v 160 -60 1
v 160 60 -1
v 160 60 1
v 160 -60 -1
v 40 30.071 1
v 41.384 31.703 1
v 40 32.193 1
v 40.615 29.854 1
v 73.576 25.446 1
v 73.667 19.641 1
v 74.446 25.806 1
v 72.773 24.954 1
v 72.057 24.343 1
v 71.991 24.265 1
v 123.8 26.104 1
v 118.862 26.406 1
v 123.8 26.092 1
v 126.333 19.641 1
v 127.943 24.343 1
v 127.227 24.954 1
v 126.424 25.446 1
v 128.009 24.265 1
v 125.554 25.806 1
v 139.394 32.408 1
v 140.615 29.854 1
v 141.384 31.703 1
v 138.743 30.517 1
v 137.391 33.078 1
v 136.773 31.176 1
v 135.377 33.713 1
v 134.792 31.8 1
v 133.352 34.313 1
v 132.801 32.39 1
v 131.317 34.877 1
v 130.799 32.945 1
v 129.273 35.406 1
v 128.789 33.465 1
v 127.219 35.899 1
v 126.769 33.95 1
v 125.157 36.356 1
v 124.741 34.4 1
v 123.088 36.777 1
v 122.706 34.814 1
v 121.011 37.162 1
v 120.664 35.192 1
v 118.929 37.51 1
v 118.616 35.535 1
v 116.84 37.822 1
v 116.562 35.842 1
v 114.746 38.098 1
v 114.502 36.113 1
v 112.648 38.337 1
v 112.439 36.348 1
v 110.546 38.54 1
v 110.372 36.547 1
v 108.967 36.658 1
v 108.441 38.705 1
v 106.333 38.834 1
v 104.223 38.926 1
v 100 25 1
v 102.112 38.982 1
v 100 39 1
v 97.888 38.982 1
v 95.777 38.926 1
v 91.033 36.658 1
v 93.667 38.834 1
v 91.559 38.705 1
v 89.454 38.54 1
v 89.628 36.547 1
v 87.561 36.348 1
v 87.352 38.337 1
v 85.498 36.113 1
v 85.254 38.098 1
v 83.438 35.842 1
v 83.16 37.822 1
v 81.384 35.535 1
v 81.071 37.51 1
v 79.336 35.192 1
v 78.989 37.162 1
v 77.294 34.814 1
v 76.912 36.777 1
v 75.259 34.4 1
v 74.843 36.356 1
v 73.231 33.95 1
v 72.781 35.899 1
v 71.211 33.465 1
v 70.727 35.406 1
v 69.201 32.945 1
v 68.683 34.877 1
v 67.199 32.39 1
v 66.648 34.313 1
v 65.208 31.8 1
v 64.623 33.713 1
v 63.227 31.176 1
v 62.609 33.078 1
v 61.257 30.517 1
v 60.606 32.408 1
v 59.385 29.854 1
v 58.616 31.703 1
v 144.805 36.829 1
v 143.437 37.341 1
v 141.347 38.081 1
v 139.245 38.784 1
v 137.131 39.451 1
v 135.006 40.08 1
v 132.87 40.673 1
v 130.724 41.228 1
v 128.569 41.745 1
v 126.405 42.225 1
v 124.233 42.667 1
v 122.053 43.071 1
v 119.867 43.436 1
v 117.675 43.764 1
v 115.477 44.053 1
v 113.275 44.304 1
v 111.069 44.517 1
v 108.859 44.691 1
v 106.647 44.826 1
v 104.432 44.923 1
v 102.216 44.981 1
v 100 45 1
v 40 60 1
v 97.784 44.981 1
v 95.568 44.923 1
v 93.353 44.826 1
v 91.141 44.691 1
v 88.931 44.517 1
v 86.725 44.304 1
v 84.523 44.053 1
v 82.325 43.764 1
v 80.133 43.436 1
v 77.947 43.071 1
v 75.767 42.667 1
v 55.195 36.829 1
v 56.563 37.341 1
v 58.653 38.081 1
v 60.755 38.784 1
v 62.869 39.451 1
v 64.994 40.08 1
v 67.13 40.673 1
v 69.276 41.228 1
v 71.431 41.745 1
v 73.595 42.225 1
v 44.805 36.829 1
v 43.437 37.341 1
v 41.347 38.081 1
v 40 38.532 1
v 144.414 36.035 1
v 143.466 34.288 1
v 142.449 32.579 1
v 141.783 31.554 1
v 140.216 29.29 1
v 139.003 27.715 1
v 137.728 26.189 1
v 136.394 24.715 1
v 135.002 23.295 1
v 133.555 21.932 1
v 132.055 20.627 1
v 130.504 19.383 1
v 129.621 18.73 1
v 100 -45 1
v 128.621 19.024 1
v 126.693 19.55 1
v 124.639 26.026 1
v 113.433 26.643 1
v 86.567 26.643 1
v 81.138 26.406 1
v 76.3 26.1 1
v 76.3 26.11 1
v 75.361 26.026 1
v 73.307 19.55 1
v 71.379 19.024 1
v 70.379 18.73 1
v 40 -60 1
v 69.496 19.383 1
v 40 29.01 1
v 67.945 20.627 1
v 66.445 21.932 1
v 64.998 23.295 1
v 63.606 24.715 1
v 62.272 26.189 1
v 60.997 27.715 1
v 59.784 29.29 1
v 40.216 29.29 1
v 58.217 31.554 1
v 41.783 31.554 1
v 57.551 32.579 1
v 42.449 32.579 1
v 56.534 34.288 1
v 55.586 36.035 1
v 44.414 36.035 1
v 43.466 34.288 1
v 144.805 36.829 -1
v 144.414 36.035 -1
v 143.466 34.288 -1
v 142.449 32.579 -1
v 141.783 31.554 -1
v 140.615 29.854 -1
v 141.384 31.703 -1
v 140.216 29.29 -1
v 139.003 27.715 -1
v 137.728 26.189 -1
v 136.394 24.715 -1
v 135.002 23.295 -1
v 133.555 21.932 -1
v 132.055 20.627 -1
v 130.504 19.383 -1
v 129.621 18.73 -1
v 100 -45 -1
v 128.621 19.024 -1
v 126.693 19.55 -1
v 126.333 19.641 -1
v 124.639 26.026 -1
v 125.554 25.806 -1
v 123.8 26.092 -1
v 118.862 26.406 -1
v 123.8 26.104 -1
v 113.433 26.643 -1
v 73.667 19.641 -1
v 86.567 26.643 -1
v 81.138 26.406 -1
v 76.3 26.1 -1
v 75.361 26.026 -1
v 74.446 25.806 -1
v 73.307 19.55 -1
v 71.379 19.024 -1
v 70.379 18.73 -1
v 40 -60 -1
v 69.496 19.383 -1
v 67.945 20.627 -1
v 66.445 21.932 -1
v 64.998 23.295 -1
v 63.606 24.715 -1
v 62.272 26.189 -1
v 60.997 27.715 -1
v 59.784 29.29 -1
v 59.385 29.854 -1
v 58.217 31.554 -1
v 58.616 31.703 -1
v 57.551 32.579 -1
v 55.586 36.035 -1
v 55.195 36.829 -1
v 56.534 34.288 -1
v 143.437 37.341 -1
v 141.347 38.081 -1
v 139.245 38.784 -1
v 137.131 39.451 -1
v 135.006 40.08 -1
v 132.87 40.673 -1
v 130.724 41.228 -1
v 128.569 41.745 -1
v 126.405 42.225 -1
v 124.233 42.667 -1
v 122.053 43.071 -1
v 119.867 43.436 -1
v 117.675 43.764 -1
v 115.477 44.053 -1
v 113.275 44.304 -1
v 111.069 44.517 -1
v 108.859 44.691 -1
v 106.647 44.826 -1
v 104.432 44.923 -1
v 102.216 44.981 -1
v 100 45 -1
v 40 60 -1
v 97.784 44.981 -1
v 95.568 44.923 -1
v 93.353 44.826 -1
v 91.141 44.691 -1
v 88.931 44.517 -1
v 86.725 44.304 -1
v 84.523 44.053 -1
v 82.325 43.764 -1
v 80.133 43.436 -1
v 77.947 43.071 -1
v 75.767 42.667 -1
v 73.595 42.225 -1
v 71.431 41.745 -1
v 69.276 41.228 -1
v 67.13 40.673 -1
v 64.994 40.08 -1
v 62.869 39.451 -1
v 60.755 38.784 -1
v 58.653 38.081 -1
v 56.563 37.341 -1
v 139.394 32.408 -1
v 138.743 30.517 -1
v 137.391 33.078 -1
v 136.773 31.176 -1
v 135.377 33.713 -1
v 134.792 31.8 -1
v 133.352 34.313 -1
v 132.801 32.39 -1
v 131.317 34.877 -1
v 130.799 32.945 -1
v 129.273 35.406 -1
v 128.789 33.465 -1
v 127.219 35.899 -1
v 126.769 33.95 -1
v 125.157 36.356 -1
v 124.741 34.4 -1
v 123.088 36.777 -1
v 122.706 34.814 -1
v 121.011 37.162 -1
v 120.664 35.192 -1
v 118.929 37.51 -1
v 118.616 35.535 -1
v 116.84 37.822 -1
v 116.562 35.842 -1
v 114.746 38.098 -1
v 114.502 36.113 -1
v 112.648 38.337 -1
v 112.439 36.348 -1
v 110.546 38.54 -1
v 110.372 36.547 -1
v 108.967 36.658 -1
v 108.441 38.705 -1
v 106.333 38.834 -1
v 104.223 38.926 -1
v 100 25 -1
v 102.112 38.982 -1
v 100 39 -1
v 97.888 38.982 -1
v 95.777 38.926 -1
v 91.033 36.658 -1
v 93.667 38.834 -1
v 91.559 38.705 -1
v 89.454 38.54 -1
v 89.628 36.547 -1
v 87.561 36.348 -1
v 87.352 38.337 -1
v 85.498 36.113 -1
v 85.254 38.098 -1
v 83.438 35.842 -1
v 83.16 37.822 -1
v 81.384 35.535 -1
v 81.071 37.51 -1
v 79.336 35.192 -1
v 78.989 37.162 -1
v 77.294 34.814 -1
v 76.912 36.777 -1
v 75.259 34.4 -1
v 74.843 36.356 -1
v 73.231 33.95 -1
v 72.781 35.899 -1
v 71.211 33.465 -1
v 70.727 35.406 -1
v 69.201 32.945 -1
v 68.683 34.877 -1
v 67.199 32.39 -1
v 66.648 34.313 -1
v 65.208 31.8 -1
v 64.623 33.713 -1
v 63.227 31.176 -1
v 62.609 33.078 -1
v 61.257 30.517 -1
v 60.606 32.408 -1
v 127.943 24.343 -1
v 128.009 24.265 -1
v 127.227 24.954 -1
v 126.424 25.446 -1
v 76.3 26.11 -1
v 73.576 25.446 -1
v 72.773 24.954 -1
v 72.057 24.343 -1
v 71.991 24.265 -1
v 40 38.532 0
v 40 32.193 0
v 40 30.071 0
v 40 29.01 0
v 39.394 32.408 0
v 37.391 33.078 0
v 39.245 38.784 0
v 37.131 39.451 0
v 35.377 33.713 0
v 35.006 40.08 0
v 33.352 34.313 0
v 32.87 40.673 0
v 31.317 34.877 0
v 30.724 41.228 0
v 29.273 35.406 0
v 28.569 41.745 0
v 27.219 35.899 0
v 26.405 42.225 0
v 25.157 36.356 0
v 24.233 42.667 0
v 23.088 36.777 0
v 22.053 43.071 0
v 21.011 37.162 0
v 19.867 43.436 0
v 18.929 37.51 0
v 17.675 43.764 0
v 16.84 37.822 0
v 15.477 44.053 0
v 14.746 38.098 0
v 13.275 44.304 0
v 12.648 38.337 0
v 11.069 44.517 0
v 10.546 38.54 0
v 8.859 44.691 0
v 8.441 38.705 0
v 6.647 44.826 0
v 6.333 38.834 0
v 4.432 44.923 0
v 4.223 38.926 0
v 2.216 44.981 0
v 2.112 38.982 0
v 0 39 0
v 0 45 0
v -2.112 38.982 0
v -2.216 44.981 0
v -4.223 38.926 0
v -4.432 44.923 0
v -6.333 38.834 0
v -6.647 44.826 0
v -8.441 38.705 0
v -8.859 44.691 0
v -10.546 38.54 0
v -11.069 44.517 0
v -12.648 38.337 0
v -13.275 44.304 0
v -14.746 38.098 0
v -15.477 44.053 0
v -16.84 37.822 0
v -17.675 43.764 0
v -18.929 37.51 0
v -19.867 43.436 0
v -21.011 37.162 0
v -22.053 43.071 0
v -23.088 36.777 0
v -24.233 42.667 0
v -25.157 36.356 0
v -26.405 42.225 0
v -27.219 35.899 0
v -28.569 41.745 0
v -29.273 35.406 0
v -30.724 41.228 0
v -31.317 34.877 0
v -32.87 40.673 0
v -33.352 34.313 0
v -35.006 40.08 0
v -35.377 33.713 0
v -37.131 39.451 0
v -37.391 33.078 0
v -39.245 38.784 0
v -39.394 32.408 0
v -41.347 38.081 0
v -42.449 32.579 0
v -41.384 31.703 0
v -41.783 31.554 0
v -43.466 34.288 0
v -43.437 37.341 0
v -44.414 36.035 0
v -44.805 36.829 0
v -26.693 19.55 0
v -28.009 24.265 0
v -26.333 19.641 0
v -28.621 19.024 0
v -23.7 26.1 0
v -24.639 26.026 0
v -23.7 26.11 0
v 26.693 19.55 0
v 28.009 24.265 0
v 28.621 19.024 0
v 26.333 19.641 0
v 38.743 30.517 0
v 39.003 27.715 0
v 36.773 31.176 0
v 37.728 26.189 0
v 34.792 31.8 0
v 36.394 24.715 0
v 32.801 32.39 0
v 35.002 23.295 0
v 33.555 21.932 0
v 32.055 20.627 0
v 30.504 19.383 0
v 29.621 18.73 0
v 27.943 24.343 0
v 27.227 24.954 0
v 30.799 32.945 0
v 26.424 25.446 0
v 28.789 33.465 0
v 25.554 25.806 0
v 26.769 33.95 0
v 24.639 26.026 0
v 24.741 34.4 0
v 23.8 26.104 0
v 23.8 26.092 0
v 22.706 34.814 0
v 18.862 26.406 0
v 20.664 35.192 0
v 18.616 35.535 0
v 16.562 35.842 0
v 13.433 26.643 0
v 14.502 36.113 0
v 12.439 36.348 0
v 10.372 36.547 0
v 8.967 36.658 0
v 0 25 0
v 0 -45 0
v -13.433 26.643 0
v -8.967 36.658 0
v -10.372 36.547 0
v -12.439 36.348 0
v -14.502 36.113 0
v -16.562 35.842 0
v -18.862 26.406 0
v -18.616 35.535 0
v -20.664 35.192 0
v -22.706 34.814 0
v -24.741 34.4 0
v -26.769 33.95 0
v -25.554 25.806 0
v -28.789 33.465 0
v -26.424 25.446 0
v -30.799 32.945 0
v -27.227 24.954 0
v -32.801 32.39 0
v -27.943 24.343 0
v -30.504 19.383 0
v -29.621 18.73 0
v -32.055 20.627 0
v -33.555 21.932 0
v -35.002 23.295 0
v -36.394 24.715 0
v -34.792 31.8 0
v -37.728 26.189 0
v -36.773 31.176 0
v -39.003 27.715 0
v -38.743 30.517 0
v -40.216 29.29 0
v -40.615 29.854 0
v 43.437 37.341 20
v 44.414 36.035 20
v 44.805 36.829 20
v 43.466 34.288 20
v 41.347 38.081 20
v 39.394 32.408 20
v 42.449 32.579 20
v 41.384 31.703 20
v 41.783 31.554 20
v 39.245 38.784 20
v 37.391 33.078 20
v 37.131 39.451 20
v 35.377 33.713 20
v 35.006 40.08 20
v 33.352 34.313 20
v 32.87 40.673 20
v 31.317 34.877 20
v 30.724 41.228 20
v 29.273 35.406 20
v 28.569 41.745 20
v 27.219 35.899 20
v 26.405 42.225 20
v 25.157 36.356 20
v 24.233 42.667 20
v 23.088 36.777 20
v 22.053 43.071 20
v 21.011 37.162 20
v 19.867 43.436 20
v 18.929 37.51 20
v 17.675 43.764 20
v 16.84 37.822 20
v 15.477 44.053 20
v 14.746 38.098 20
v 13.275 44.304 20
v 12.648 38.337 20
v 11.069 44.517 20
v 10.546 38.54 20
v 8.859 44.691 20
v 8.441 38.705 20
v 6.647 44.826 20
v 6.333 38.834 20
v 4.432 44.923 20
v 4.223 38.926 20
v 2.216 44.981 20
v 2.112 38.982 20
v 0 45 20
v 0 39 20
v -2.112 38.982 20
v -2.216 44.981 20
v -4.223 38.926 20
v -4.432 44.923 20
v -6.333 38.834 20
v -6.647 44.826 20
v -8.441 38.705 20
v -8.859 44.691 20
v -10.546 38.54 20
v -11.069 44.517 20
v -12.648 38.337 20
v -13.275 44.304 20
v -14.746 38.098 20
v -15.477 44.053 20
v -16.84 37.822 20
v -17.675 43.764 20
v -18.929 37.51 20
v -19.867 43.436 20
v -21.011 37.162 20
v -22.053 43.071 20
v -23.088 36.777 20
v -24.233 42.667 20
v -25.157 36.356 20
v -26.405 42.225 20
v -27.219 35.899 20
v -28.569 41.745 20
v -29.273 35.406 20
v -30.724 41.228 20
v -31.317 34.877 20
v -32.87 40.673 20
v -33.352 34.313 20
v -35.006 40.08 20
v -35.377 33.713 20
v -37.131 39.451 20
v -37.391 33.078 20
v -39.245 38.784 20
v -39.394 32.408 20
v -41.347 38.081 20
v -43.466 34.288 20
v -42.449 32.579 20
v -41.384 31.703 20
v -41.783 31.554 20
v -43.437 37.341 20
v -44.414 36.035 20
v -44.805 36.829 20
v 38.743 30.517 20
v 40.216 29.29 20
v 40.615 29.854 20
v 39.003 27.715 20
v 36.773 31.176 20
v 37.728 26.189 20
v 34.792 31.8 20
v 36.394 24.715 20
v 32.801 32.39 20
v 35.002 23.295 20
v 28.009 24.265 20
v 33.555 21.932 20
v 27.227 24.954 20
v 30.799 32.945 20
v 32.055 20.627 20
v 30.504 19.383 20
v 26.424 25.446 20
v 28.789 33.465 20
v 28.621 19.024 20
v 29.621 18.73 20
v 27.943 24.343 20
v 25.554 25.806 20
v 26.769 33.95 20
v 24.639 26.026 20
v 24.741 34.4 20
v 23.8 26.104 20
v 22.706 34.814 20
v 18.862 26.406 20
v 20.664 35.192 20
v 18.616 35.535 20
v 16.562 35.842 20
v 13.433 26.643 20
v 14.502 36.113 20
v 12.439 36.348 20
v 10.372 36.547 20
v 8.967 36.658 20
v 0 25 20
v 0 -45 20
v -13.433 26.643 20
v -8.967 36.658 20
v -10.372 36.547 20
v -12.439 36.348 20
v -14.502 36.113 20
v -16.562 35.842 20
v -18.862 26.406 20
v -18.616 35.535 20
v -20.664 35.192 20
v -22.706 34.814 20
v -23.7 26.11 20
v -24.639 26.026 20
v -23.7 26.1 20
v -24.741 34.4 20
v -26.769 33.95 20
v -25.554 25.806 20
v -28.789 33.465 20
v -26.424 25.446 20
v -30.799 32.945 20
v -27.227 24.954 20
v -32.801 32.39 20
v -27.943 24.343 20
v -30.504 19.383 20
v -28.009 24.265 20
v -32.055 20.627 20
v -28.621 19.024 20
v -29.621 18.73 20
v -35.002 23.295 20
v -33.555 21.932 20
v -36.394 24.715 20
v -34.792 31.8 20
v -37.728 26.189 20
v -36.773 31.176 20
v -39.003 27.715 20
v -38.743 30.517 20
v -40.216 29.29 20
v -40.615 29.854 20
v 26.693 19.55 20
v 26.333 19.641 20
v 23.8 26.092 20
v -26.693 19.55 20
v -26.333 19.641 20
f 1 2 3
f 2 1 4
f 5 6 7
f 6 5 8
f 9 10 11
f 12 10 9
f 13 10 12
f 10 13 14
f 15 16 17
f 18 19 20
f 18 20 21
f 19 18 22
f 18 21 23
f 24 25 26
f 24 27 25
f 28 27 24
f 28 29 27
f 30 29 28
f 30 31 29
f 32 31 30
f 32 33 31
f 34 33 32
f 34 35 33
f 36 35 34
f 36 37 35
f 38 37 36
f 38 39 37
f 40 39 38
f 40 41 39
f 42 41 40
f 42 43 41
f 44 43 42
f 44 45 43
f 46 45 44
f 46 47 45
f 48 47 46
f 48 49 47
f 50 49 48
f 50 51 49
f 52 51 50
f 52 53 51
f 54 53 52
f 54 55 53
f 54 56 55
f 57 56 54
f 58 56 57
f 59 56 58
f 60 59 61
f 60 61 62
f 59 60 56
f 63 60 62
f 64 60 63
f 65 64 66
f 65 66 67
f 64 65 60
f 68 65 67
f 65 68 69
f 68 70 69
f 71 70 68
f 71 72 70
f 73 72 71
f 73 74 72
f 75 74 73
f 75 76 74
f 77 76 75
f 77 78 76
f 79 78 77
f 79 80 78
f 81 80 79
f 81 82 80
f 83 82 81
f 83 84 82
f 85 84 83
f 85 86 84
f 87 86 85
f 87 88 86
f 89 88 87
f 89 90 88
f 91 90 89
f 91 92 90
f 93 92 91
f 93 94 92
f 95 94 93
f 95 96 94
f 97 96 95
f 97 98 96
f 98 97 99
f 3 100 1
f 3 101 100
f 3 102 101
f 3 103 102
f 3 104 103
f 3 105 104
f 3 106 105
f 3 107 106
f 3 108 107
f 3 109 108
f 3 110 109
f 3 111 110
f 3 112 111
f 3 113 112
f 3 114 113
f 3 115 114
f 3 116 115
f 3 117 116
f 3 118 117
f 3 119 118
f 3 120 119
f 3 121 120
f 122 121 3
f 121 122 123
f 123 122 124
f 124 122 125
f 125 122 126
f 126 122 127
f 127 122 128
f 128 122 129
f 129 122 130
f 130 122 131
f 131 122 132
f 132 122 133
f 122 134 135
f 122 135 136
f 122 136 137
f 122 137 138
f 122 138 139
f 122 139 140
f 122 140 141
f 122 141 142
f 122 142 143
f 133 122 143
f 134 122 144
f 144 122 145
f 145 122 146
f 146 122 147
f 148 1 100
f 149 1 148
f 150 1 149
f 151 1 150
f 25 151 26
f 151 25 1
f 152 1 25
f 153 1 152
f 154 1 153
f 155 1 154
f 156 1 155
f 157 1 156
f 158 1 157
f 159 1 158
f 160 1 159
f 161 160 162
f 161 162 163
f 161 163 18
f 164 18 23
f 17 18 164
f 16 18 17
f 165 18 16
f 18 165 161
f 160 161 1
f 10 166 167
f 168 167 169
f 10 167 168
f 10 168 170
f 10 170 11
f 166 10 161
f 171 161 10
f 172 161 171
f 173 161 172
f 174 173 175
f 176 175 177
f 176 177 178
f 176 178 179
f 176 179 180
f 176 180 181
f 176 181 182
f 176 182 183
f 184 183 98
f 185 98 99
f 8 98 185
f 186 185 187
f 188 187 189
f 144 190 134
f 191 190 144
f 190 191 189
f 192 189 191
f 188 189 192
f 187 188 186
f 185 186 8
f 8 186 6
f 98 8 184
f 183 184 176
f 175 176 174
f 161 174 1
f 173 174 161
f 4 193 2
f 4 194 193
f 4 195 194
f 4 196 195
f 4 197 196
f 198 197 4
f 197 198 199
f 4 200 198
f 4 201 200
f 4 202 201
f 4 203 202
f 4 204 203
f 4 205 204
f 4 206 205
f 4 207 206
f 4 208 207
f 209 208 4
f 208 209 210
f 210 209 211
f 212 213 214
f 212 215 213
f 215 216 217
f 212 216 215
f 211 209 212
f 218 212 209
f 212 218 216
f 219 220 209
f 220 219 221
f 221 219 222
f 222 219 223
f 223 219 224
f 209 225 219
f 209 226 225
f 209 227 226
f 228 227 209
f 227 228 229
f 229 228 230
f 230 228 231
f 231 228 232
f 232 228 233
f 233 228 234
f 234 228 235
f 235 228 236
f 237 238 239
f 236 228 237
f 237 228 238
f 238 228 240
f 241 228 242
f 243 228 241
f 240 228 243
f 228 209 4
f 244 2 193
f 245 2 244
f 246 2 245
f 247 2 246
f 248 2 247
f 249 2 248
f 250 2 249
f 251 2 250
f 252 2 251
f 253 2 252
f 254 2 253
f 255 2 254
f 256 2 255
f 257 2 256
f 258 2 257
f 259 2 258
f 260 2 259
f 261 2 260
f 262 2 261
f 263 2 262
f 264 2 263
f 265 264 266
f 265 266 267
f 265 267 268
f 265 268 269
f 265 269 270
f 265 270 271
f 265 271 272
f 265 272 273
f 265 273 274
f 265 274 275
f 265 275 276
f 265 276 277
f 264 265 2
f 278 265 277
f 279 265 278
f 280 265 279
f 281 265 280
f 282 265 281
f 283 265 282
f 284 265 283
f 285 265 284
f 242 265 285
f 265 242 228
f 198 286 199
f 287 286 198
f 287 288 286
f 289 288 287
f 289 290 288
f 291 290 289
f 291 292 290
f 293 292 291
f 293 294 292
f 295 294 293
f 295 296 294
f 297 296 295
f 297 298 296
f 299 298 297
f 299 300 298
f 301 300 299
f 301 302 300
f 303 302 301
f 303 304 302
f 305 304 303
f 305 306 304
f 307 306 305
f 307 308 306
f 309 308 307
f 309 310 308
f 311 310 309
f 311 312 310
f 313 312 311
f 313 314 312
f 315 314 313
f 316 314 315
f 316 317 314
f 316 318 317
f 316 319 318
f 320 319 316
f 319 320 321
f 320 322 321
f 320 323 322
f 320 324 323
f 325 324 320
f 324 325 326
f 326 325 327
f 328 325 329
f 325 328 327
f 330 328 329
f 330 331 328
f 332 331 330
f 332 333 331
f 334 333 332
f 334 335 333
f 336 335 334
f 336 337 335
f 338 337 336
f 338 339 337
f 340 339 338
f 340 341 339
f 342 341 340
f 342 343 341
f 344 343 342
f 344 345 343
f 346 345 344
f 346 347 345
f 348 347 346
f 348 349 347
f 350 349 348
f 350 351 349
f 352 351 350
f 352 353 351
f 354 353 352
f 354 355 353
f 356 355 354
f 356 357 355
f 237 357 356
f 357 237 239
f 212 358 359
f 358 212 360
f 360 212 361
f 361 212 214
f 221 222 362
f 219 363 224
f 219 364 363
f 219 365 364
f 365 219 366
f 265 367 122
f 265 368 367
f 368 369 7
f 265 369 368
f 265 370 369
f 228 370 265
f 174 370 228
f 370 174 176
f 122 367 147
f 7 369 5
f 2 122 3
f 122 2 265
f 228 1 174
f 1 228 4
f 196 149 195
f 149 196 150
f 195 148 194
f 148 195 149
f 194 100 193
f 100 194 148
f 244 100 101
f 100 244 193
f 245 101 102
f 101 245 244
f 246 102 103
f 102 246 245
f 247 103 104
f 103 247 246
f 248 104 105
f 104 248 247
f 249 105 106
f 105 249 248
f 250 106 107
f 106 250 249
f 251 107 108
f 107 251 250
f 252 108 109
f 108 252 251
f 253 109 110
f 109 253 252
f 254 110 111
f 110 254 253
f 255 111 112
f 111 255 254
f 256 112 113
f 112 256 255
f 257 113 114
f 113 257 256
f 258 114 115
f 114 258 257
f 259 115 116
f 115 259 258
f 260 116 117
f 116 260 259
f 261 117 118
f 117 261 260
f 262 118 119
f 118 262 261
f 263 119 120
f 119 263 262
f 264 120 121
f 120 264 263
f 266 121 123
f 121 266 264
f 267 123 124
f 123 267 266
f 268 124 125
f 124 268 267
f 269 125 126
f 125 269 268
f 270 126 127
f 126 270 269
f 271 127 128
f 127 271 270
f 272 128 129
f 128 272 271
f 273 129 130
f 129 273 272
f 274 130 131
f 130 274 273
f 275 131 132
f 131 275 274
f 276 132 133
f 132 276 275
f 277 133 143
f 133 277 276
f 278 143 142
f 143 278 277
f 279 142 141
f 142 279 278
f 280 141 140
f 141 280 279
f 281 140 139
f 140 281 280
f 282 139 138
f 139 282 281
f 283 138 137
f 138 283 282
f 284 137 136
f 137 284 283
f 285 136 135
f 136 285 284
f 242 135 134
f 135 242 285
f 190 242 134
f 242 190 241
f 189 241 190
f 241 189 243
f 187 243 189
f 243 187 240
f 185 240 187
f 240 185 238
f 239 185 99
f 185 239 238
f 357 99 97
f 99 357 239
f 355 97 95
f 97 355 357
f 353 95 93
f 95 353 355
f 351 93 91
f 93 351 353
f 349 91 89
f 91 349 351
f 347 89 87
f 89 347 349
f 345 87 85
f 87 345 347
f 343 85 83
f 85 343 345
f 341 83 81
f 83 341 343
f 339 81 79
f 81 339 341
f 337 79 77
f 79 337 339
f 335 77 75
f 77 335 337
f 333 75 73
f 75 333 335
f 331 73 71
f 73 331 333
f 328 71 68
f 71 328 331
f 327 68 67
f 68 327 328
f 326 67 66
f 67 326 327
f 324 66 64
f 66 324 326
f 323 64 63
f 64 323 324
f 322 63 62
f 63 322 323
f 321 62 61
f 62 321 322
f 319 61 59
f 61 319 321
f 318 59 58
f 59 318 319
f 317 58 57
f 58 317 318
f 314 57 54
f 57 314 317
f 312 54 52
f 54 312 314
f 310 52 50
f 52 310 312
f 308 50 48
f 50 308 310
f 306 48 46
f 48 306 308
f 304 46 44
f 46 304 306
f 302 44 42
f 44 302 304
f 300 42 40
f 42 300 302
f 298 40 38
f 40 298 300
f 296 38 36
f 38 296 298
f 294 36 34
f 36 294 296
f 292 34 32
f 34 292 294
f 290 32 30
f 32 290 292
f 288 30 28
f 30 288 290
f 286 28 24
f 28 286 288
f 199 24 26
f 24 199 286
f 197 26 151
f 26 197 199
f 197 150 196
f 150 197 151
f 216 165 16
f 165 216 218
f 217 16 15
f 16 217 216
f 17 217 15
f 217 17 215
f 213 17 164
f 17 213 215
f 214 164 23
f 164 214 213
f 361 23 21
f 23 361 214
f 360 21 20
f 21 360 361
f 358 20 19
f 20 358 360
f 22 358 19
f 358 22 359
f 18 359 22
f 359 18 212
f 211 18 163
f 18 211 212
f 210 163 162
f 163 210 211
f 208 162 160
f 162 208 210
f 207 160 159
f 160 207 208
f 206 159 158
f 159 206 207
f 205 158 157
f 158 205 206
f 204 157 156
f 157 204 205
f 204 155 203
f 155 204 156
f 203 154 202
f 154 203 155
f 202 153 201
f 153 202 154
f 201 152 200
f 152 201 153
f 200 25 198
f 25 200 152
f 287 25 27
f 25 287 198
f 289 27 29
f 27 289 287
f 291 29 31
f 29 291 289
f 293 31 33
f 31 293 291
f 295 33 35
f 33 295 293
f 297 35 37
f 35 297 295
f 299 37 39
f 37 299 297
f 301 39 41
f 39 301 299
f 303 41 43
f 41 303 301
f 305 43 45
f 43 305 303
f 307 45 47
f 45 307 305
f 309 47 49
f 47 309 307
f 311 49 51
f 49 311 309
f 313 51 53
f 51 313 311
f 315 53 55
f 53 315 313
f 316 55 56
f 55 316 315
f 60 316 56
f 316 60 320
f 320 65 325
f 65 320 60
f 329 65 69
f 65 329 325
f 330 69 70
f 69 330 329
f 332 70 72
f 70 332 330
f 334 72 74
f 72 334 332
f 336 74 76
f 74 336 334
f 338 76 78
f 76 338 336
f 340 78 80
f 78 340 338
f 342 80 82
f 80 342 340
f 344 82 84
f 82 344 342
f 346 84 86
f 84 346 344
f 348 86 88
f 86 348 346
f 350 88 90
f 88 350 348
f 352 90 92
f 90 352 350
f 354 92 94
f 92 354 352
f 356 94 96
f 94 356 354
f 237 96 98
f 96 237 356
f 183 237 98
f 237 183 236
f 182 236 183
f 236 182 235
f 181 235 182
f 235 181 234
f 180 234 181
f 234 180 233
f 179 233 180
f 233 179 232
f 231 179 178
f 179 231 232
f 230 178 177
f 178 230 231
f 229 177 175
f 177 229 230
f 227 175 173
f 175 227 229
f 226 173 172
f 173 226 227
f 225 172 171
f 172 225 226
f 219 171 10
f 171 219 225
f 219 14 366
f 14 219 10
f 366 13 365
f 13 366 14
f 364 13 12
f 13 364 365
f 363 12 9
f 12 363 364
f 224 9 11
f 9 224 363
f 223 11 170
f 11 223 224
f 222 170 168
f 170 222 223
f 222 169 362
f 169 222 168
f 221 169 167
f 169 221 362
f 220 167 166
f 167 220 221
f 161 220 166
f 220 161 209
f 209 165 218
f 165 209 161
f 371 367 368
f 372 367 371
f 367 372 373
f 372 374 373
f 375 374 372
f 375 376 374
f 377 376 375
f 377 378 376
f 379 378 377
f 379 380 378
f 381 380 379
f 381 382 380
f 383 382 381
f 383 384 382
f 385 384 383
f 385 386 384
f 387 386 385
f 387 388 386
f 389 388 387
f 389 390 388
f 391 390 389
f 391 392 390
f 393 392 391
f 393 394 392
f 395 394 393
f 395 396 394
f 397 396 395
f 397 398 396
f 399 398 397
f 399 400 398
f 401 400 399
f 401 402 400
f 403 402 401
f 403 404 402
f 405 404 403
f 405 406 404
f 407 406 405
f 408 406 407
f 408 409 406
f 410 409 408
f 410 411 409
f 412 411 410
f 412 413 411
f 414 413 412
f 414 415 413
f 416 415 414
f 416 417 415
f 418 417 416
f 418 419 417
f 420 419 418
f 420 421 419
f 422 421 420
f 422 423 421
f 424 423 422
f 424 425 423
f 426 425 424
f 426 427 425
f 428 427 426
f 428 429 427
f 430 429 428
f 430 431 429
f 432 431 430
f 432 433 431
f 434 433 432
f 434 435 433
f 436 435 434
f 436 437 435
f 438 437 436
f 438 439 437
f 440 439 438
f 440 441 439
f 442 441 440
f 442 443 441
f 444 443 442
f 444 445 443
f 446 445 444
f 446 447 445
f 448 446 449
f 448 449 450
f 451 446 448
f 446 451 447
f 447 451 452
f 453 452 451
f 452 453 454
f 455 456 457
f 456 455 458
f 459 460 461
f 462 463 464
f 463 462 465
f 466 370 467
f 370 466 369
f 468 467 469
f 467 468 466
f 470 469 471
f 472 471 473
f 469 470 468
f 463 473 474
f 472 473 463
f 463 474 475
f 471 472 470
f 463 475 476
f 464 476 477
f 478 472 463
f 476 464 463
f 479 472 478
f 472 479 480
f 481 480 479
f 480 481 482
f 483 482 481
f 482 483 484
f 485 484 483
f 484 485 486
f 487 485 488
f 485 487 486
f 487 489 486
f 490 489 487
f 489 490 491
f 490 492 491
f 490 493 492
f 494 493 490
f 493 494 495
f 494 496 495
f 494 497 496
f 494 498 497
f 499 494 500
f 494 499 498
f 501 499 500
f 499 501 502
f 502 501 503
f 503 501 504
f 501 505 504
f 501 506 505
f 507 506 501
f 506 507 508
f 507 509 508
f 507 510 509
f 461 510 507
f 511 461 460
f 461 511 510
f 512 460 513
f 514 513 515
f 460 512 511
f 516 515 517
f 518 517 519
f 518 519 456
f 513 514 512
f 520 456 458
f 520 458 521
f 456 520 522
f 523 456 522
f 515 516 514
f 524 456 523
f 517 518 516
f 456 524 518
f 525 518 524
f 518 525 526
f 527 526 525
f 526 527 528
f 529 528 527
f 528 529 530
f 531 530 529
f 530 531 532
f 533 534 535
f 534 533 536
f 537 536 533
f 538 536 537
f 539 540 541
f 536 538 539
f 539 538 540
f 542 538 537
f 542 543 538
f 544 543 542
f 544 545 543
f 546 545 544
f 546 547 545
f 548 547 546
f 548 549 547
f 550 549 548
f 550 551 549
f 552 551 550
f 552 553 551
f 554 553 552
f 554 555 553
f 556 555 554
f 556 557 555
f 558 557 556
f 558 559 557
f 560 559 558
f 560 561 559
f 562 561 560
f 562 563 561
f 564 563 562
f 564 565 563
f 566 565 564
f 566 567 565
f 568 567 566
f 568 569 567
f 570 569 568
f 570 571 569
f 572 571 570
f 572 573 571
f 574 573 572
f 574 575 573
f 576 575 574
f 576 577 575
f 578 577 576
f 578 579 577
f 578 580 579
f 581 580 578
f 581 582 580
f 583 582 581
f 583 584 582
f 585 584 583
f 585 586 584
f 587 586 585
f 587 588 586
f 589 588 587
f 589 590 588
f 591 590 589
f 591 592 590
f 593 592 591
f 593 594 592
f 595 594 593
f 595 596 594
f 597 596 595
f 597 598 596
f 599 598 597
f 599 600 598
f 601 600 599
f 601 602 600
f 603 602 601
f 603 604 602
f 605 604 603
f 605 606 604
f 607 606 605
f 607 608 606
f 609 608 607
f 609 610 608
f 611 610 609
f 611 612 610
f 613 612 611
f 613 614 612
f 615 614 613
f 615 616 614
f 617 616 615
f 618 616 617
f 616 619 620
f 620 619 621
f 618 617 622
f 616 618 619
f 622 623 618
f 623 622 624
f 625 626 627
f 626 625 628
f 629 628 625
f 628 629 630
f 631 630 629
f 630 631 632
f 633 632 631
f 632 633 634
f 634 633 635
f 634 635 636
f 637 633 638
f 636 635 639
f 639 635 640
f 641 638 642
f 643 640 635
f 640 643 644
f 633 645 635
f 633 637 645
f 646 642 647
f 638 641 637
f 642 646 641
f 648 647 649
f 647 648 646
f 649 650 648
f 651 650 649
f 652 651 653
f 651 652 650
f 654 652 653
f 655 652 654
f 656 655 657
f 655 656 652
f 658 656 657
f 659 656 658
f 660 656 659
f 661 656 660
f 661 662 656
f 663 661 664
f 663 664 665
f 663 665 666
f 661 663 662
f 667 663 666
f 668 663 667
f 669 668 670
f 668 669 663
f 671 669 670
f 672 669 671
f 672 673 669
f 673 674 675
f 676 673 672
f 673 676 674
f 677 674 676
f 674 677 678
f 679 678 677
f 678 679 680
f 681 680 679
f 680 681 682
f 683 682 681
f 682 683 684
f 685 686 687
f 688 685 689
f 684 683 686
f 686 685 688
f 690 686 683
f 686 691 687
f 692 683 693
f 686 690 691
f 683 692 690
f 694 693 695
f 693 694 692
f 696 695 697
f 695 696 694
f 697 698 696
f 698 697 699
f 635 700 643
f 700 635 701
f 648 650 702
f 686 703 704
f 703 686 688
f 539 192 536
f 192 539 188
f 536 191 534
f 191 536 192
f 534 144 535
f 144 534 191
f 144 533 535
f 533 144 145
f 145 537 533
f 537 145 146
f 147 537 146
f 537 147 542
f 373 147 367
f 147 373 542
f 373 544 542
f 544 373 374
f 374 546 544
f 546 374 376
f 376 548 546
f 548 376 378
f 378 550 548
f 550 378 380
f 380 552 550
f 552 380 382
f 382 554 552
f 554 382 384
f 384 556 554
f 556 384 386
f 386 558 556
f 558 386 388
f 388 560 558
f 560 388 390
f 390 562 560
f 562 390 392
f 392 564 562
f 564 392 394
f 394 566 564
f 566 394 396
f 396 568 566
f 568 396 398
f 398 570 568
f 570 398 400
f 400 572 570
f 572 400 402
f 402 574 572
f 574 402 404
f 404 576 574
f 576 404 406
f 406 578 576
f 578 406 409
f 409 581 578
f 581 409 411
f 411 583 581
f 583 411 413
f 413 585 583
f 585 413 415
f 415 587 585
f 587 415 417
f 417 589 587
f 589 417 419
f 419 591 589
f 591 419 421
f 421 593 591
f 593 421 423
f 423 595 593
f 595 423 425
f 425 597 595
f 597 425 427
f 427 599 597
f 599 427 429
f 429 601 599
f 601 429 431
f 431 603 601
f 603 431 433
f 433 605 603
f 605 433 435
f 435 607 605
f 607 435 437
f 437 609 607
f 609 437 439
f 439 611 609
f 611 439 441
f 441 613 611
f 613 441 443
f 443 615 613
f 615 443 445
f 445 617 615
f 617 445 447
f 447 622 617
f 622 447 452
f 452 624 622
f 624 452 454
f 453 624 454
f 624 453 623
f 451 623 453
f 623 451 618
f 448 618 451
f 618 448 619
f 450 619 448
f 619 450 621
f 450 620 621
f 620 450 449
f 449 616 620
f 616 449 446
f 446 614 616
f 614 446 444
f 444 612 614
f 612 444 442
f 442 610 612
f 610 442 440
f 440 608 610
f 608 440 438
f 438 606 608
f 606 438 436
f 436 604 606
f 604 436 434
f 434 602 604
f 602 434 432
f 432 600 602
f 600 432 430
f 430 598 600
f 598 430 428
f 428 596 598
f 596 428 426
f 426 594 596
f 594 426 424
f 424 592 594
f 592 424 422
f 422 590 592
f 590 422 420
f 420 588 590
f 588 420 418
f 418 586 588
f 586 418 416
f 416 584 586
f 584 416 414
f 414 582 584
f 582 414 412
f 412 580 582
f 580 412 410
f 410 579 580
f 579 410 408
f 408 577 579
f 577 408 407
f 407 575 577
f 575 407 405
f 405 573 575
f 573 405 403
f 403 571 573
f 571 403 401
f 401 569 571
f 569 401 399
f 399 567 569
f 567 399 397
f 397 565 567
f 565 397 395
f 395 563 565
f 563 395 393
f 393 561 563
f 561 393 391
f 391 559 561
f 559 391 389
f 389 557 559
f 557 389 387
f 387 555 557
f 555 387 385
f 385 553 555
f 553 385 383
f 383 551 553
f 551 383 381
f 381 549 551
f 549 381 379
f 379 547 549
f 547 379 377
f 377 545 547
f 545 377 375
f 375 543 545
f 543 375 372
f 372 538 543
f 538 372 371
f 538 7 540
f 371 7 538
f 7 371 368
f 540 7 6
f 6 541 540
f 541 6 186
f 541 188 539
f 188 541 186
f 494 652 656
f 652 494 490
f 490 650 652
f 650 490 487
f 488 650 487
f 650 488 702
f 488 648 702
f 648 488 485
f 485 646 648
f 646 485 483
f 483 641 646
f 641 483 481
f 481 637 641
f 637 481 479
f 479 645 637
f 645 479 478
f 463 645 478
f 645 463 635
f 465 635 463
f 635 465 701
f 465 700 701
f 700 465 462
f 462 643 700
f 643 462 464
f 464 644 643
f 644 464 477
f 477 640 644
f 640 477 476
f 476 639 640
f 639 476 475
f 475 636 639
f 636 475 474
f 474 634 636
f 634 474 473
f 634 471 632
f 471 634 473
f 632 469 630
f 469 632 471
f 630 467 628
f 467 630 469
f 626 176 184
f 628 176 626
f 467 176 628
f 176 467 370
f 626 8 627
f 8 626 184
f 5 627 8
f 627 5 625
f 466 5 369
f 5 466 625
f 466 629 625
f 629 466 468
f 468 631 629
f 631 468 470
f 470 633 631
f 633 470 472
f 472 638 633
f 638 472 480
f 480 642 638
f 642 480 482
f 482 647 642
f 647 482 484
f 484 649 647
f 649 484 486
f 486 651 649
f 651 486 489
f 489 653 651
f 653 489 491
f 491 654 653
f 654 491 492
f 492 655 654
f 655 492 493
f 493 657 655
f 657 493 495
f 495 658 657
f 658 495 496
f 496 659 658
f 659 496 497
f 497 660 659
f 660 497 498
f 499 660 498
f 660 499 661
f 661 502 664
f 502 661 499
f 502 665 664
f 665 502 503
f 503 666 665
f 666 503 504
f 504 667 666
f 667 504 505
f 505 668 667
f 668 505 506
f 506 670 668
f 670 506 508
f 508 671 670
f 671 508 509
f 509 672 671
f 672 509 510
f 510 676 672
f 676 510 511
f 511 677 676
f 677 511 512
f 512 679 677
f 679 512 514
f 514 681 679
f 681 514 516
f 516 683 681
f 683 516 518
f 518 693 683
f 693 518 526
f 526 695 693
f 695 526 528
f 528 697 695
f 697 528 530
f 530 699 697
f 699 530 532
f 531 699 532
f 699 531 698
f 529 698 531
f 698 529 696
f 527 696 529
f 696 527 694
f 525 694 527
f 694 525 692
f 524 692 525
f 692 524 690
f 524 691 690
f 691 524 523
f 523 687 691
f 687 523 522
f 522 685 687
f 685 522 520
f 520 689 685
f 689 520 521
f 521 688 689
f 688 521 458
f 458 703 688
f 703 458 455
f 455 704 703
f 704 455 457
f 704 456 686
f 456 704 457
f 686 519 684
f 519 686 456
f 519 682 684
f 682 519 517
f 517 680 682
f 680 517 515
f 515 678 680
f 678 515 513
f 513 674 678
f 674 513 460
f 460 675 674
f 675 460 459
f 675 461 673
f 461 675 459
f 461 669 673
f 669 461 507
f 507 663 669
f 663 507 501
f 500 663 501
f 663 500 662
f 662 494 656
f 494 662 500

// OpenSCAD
//color("red") import("tesla_logo.svg");
//translate([49.5,0,-1])
//translate([100,0,0])tesla_logo();
//%square(100,center = true);
color("red")
linear_extrude(height=20) tesla_logo();

translate([100,0,0])
difference()
{
cube([120,120,2],center = true);
translate([0,0,-5])linear_extrude(height=20) tesla_logo();
}

module tesla_logo()
{
  dreieck = [[-10,0],[0,-13], [10,0]];
  spitze = [[-15,0],[0,-080], [15,0]];
color("red")
    //scale(10/9) //make it to size 100
  translate([0,-82,0]) //center it
  {
    intersection()
    {
      union()
      {
	difference() //Aussenring
	{
	  circle(d=254, $fa=1);
	  circle(d=242, $fa=1);
	}
	difference() //Innenring
	{
	    circle(d=238, $fa=1); //Innen gross
	  union()
	  {
	color("blue")
	    circle(d=210, $fa=1);
	    translate([0,120,0])polygon(dreieck);
	    difference()
	    {
	      umaske(); //schneide dir Spitze raus
	      difference()
	      {
	        union()
	        {
	          translate([23.8,96.2,0]) square(14); //Enden wegnehmen
	          translate([-37.7,96.2,0]) square(14);
	        }
	        union()
	        {
	          translate([23.7,102.1,-0]) circle(d=12, $fn=40);
	          translate([-23.7,102.1,-0]) circle(d=12, $fn=40);
	        }
	      }
	    }
	  }
	}
      }
      translate([0,141,0]) circle(d=100, $fa=1); //obere Selektion
    }
    difference() //Spitze, unschön, weiss aber nicht wie es beser gemacht werden könnte
    {
      translate([0,117,-0])polygon(spitze);
      translate([0,120,-0])polygon(dreieck);
    }
  }
}

module umaske()
{
  maske = [[-29,0],[0,-080], [29,0]];
  intersection()
  {
      translate([0,109,-0])polygon(maske);
      translate([0,-251.5,-0]) circle(d=720.8, $fa=1);
  }
}
